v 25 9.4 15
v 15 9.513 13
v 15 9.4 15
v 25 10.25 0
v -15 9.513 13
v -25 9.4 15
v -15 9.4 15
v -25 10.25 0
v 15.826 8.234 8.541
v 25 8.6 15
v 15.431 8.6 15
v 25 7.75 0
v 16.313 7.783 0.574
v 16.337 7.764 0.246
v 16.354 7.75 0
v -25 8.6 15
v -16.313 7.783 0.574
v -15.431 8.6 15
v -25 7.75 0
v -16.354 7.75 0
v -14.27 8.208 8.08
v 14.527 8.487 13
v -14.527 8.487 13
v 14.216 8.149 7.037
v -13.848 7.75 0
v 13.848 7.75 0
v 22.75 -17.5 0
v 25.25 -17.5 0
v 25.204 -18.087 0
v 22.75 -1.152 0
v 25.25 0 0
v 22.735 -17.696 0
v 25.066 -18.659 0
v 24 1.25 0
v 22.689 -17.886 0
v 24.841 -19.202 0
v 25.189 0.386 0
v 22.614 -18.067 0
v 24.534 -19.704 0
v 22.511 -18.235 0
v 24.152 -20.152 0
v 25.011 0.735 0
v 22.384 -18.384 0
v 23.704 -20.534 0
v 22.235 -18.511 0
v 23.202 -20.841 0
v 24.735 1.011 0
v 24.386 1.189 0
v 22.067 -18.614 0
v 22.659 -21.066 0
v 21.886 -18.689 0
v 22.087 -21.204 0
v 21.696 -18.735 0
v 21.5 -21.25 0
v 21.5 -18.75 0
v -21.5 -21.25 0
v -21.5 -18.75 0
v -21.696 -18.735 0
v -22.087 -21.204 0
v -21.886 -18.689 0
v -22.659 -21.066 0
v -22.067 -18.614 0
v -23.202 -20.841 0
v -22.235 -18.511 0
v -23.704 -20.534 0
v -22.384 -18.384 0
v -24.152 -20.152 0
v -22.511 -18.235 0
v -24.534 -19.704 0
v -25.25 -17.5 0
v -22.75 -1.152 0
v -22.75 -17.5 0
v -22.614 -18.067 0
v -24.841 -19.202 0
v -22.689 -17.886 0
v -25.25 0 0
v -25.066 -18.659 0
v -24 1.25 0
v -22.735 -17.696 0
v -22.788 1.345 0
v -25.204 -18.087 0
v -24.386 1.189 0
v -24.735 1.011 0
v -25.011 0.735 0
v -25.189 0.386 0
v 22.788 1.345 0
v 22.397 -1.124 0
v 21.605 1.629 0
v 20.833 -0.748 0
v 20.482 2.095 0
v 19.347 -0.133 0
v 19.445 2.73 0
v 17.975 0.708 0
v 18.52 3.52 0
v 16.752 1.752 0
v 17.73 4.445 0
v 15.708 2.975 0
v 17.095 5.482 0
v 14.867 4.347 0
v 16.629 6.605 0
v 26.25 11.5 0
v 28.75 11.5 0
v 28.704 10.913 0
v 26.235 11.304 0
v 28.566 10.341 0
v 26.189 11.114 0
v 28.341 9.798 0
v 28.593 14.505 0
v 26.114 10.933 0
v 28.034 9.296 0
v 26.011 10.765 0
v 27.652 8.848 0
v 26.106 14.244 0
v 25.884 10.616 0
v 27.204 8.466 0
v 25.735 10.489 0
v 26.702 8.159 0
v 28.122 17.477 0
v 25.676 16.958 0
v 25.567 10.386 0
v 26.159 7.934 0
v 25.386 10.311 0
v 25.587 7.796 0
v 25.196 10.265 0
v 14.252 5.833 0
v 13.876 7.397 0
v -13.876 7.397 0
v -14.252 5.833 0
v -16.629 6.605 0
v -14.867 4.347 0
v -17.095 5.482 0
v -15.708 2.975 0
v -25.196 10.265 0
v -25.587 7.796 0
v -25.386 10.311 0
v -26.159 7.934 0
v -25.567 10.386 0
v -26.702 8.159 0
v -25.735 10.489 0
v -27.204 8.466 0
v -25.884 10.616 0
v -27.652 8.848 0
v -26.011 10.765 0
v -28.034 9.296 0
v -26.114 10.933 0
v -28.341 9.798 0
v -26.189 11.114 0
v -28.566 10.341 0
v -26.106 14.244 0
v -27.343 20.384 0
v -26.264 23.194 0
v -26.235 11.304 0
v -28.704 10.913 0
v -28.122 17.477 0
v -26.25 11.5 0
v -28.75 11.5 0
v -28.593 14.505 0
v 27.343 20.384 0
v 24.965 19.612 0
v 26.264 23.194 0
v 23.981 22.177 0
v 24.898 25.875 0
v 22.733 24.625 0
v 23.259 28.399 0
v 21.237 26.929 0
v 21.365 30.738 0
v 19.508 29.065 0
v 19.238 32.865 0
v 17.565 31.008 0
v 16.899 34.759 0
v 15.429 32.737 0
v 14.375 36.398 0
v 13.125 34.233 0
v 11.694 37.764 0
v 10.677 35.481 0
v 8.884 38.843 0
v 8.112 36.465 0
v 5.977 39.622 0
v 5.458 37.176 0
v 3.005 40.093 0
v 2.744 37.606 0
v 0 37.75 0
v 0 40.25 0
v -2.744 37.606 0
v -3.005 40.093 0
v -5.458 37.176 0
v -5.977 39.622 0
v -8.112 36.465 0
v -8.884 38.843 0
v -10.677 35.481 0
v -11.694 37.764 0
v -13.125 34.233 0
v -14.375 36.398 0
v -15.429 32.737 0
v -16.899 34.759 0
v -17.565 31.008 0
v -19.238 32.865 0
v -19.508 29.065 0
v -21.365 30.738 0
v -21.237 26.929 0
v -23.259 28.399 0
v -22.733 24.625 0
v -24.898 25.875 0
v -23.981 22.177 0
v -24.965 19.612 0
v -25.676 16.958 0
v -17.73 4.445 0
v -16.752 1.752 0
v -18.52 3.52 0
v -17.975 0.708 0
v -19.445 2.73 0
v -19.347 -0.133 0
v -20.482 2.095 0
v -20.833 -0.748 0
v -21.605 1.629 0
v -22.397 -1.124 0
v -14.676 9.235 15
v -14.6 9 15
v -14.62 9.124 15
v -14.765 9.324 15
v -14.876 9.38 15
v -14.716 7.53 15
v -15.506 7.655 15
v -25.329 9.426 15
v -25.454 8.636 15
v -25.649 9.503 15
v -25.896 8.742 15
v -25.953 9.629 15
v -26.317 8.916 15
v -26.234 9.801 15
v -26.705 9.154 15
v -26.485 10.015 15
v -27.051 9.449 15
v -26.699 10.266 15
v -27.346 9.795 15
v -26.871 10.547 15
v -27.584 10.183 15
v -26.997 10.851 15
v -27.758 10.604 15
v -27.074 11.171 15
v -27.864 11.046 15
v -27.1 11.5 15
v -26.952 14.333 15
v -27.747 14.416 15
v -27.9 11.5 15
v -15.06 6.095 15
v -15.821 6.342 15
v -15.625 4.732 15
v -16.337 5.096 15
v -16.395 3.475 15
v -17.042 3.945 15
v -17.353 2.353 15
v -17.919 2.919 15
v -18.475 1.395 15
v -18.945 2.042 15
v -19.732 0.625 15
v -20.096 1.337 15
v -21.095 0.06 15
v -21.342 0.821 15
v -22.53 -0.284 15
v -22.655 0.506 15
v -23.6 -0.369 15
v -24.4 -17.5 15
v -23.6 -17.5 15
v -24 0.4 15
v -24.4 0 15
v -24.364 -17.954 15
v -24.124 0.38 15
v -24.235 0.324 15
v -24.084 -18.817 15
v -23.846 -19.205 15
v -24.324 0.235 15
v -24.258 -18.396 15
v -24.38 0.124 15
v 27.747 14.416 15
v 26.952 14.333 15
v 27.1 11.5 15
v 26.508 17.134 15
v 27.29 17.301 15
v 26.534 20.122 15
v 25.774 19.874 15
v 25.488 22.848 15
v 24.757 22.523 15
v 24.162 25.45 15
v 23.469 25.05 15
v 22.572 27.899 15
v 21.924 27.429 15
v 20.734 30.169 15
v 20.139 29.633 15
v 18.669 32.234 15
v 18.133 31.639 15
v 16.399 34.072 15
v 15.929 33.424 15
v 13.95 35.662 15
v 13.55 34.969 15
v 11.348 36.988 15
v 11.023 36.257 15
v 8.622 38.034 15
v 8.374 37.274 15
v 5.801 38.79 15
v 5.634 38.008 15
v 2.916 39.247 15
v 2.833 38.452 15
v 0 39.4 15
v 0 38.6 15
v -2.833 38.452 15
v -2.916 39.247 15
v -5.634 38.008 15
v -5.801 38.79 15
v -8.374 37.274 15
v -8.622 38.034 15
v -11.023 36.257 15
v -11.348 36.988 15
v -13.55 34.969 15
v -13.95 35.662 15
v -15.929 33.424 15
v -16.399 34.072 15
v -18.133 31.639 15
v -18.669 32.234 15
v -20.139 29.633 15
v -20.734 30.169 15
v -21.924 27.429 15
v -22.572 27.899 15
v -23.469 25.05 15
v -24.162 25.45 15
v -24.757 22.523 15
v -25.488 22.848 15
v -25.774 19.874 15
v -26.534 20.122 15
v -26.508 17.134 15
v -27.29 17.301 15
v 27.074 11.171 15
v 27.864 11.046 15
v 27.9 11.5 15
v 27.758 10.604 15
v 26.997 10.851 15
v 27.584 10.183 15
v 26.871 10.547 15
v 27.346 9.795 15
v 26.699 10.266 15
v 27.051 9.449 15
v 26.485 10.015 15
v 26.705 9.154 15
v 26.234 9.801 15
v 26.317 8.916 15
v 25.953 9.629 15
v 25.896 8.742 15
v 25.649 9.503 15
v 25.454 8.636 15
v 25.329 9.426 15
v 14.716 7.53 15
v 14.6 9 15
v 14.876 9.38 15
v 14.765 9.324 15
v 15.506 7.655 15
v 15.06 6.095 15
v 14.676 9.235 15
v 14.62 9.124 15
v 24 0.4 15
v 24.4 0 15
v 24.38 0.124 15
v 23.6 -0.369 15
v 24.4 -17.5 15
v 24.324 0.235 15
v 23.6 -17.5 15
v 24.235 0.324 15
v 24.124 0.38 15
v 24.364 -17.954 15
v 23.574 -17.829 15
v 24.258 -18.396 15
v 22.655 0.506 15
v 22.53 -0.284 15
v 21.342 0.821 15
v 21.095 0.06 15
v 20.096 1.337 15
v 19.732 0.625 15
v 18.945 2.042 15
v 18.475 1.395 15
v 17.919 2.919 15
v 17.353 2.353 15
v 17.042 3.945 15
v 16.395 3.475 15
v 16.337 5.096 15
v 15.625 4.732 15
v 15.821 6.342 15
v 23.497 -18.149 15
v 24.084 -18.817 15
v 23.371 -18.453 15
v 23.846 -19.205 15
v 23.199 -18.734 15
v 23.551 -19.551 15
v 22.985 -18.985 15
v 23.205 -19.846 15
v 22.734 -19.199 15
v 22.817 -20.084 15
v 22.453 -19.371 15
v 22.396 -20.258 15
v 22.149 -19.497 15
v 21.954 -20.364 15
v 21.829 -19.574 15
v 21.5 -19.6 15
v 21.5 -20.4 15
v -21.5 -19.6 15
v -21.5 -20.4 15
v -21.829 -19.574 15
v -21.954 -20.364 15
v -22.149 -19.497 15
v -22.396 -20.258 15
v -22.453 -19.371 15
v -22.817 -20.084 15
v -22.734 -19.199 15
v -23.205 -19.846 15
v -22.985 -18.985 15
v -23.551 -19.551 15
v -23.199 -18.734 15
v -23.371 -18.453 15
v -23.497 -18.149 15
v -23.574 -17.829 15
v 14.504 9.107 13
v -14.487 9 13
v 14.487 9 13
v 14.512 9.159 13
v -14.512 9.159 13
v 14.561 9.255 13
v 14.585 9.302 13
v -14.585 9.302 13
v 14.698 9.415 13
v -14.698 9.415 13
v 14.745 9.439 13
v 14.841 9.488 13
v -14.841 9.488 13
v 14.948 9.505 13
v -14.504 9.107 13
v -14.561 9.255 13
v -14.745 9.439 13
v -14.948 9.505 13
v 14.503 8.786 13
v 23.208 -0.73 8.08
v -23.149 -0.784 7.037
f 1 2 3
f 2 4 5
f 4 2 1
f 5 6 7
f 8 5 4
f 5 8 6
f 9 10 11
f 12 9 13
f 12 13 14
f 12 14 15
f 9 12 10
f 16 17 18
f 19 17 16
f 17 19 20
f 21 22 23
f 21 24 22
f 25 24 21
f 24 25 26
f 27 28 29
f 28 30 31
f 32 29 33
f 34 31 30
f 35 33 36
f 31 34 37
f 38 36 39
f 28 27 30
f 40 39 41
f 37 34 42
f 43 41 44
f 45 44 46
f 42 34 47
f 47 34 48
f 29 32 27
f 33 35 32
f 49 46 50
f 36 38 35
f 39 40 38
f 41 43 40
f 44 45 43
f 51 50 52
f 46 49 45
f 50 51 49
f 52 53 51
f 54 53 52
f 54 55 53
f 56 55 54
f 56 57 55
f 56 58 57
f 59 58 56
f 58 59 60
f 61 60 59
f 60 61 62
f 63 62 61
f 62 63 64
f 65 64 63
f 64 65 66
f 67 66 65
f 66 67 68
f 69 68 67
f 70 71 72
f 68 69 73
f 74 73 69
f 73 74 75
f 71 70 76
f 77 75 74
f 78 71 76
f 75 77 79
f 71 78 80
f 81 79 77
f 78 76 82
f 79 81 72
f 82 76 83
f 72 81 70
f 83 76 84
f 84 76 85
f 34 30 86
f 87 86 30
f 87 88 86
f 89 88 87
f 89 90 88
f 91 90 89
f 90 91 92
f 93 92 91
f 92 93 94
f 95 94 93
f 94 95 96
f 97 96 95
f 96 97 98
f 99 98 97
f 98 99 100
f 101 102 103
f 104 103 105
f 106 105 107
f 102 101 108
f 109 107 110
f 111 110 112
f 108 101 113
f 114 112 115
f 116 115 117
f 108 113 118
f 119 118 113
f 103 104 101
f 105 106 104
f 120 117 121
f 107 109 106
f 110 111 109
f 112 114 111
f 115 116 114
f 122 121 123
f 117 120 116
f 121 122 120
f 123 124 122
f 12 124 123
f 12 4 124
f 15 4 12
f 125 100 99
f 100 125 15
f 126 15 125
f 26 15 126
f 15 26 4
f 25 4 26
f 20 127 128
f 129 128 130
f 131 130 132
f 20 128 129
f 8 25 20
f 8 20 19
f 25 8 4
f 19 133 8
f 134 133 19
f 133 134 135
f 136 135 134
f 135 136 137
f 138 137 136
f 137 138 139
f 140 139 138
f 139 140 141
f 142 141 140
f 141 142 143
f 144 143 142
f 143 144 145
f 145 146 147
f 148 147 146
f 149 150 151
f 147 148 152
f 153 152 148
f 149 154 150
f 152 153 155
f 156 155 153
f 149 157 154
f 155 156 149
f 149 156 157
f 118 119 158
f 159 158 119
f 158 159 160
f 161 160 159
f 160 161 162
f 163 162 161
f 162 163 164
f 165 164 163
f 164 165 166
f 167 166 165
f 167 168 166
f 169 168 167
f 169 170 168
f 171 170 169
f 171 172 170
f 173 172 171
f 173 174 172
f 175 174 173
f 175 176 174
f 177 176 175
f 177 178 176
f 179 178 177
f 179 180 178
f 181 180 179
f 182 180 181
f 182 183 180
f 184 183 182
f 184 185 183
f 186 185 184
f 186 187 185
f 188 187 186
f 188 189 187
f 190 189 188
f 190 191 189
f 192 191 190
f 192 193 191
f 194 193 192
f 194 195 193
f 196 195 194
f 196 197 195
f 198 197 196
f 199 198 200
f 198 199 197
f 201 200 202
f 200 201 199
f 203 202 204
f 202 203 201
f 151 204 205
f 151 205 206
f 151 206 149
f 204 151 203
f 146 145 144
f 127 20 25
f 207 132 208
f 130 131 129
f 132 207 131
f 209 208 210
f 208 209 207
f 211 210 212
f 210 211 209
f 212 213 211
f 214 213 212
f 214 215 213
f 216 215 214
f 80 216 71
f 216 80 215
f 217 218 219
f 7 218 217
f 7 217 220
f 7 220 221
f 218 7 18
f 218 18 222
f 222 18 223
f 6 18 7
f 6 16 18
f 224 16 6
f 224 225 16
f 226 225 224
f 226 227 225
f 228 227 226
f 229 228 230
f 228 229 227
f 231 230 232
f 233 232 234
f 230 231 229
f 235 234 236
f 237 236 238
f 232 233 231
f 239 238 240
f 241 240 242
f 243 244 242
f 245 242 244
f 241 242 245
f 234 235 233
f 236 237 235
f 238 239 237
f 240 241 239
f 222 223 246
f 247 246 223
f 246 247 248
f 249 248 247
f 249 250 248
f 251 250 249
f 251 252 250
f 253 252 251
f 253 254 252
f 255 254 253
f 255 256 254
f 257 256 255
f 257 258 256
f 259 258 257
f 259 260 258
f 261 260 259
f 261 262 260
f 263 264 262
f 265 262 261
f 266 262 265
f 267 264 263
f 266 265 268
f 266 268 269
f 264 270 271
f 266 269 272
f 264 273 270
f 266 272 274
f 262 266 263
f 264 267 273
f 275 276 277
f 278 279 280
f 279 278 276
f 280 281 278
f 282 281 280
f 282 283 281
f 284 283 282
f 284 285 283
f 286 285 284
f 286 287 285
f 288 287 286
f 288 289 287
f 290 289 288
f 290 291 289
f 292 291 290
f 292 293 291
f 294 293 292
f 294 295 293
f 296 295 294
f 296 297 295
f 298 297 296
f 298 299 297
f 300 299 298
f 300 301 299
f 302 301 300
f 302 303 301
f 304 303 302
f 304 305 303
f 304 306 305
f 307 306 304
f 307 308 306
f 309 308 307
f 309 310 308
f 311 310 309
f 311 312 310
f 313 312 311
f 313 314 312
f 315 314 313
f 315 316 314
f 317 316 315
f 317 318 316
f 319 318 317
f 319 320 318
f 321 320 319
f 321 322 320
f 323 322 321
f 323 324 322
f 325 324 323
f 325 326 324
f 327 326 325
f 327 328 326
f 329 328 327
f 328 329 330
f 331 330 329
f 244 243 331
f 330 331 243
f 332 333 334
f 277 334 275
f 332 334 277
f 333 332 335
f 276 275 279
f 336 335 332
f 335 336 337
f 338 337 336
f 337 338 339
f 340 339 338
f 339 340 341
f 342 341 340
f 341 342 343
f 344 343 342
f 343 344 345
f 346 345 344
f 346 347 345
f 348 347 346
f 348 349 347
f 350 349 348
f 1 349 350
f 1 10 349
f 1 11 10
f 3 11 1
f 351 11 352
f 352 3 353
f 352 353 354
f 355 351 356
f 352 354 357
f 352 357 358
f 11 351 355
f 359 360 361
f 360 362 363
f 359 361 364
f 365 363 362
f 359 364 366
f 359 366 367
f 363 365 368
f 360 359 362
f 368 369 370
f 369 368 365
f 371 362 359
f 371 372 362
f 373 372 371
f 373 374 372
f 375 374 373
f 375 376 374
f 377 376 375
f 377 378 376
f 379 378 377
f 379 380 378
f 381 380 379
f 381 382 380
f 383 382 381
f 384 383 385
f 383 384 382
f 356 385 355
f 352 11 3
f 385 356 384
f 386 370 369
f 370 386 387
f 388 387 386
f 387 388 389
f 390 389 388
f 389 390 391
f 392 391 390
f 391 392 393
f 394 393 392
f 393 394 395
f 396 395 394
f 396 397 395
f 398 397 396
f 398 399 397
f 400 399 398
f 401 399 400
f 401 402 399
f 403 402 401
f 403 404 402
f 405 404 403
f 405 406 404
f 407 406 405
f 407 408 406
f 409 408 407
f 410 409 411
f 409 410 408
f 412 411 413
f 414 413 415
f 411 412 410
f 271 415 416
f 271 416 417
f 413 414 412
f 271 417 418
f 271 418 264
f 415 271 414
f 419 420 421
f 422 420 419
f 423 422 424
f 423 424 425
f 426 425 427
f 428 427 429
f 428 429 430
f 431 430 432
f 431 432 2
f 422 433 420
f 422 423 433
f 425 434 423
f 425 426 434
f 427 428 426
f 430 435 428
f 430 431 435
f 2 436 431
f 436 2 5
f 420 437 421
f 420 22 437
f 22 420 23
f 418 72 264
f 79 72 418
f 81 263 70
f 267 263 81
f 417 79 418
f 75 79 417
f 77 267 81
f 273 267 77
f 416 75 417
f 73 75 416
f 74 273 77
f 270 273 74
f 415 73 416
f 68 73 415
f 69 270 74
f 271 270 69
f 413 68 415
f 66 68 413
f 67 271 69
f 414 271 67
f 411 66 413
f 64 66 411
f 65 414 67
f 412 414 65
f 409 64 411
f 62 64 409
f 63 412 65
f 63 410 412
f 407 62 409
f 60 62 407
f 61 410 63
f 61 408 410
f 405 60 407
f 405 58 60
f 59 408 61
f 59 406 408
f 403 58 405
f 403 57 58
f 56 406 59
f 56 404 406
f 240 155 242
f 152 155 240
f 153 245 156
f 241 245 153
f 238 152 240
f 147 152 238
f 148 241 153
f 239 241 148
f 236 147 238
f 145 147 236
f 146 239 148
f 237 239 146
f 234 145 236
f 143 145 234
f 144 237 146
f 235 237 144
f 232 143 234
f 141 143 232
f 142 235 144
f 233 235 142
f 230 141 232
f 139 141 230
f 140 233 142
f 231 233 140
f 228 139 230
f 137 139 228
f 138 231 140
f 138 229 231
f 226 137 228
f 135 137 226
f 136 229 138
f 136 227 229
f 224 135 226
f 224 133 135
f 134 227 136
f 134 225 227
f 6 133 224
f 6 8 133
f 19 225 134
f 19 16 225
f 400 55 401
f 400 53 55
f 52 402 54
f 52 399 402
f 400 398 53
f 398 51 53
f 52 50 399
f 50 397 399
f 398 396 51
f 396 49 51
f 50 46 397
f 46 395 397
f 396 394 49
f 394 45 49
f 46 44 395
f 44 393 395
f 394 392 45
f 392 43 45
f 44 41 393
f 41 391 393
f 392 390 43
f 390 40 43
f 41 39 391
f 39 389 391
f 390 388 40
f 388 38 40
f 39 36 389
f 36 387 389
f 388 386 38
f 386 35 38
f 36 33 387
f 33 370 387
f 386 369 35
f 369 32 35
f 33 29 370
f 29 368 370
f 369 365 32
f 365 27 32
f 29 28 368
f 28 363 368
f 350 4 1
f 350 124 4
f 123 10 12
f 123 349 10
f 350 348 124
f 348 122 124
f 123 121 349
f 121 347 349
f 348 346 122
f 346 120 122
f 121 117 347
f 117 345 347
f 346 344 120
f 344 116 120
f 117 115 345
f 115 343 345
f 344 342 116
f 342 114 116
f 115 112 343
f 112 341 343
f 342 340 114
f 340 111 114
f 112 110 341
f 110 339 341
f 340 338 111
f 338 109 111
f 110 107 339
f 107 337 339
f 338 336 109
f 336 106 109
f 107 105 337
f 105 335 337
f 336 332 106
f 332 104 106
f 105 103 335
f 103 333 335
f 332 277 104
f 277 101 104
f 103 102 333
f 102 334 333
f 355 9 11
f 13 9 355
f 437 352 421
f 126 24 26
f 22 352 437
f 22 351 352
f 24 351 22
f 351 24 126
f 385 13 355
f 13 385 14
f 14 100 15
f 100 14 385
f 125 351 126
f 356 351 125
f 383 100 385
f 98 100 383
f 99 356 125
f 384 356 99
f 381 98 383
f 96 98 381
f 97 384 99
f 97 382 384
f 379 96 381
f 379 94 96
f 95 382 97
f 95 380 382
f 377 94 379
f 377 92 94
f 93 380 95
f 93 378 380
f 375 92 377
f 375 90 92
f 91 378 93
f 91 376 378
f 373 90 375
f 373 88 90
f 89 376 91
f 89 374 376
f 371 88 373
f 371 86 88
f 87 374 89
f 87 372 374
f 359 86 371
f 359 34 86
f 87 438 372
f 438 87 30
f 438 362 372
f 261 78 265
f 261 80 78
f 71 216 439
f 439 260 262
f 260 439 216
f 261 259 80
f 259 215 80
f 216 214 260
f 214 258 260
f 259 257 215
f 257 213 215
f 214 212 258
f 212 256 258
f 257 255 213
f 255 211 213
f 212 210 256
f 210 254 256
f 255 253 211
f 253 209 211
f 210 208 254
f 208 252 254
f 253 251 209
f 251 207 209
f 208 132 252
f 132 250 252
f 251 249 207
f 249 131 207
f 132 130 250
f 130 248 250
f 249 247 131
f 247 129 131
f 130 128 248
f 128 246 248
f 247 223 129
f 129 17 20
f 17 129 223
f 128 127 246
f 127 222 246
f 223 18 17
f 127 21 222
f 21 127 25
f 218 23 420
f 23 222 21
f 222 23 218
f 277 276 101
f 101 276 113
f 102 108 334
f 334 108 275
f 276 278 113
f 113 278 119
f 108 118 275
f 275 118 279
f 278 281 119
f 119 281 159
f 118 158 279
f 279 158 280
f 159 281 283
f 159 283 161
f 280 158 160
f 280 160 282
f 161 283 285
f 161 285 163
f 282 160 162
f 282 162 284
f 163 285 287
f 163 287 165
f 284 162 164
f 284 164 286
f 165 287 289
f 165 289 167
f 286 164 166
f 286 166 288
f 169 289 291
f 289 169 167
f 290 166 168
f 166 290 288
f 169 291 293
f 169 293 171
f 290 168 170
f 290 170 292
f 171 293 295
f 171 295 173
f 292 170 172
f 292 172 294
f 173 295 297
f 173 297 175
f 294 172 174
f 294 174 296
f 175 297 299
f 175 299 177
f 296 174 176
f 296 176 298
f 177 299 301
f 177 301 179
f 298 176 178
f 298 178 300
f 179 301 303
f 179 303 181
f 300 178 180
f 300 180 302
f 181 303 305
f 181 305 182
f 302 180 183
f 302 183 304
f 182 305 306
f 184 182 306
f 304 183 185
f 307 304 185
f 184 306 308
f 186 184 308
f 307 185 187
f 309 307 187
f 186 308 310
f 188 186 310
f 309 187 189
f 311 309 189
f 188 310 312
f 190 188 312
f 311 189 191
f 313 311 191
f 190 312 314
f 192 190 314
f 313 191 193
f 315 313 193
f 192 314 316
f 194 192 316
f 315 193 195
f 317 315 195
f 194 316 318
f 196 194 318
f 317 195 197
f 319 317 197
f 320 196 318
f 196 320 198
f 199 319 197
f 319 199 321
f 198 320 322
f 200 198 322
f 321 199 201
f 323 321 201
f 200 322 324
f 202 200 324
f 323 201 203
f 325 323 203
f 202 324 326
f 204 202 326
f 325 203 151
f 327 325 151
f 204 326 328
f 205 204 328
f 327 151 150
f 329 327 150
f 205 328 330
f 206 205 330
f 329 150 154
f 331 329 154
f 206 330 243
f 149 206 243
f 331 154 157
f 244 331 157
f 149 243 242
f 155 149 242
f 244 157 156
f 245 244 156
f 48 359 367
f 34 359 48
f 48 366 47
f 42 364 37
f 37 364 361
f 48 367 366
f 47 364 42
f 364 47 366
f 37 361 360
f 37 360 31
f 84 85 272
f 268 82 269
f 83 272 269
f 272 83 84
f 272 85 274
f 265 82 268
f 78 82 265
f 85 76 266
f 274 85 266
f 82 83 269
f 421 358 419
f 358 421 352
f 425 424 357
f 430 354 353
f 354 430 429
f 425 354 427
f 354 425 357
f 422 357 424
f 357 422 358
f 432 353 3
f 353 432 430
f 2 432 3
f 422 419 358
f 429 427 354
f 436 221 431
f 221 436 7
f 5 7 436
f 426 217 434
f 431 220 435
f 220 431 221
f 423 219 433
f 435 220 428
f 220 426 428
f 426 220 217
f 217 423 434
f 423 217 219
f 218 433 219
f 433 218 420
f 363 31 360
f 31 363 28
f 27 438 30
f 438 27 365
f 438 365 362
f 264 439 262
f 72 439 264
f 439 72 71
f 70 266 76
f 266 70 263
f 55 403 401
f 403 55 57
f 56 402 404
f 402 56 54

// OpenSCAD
// variables / proportions
w1 = 2.5;   // wall thickness where you touch the cookie cutter
w2 = 0.8;   // wall thickness where it cuts the dough
h = 15;     // height
bk = 55; // width knob head
bf = 48; // width foot
hf = 20; // height foot
rs = 2.5;  // small radii
rl = 9; // large radii
dt = 2;  // dough thickness at the carve, '0' for cut
shape_points = [[w1/2, 0], [-w1/2, 0], [-w2/2, h], [w2/2, h]];
half_shape_points = [[w1/2, 0], [0, 0], [0, h], [w2/2, h]];

// small radii
translate([-bf/2 +rs, -hf+rs]) rotate ([0,0, 180]) 
    rotate_extrude(angle = 90, $fn = 40) translate ([rs, 0]) 
        polygon(points=shape_points); 
translate([-bk/2 +rs, rl +rs]) rotate ([0,0, 180]) 
    rotate_extrude(angle = 90, $fn = 40) translate ([rs, 0]) 
        polygon(points=shape_points);
translate([bf/2-rs, -hf+rs]) rotate ([0,0, 270]) 
    rotate_extrude(angle = 90, $fn = 40) translate ([rs, 0]) 
        polygon(points=shape_points);
translate([bk/2-rs, rl+rs]) rotate ([0,0, 270]) 
    rotate_extrude(angle = 90, $fn = 40) translate ([rs, 0]) 
        polygon(points=shape_points);

// large radii
translate([bf/2, rl, 0])rotate ([0,0, 180])
    rotate_extrude(angle = 90, $fn = 40) translate ([rl, 0]) 
        polygon( points=shape_points );
translate([-bf/2, rl, 0])rotate ([0,0, 270])
    rotate_extrude(angle = 90, $fn = 40) translate ([rl, 0]) 
        polygon( points=shape_points );

// cupola
translate([0, rl + rs, 0])rotate_extrude(angle = 180, $fn = 60) 
    translate ([bk/2, 0]) polygon( points=shape_points );

// corner stones next to large radii
translate([bf/2, 0, 0])rotate_extrude($fn = 20) 
    polygon(points=half_shape_points); 
translate([-bf/2, 0, 0])rotate_extrude($fn = 20) 
    polygon(points=half_shape_points); 
translate([bf/2-rl, rl, 0])rotate_extrude($fn = 20) 
    polygon(points=half_shape_points); 
translate([-bf/2+rl, rl, 0])rotate_extrude($fn = 20) 
    polygon(points=half_shape_points); 

// straight sides
translate([bf/2, -hf+rs, 0])xz_extrude(shape_points, hf-rs, false);
translate([-bf/2, -hf+rs, 0])xz_extrude(shape_points, hf-rs, false);
translate([0, -hf,0])yz_extrude(shape_points, bf-2*rs, true);
difference(){
    translate([0, rl, 0])yz_extrude(shape_points, bk-2*rs, true);
    translate([0, 0, 1.5*h-dt])cube([bf-2*rl, 3*rl, h], true);
};

// modules
module xy_extrude(points, height, center = true) {
    linear_extrude(height = height, center = center) 
        polygon(points = points); 
};

module xz_extrude(points , height , center = true){
    rotate([90, 0, 0])
        mirror([0, 0, 1])        
            xy_extrude(points, height, center);            
};

module yz_extrude(points , height , center = true){
    rotate([90, 0, 90])
        xy_extrude(points, height, center);
};
